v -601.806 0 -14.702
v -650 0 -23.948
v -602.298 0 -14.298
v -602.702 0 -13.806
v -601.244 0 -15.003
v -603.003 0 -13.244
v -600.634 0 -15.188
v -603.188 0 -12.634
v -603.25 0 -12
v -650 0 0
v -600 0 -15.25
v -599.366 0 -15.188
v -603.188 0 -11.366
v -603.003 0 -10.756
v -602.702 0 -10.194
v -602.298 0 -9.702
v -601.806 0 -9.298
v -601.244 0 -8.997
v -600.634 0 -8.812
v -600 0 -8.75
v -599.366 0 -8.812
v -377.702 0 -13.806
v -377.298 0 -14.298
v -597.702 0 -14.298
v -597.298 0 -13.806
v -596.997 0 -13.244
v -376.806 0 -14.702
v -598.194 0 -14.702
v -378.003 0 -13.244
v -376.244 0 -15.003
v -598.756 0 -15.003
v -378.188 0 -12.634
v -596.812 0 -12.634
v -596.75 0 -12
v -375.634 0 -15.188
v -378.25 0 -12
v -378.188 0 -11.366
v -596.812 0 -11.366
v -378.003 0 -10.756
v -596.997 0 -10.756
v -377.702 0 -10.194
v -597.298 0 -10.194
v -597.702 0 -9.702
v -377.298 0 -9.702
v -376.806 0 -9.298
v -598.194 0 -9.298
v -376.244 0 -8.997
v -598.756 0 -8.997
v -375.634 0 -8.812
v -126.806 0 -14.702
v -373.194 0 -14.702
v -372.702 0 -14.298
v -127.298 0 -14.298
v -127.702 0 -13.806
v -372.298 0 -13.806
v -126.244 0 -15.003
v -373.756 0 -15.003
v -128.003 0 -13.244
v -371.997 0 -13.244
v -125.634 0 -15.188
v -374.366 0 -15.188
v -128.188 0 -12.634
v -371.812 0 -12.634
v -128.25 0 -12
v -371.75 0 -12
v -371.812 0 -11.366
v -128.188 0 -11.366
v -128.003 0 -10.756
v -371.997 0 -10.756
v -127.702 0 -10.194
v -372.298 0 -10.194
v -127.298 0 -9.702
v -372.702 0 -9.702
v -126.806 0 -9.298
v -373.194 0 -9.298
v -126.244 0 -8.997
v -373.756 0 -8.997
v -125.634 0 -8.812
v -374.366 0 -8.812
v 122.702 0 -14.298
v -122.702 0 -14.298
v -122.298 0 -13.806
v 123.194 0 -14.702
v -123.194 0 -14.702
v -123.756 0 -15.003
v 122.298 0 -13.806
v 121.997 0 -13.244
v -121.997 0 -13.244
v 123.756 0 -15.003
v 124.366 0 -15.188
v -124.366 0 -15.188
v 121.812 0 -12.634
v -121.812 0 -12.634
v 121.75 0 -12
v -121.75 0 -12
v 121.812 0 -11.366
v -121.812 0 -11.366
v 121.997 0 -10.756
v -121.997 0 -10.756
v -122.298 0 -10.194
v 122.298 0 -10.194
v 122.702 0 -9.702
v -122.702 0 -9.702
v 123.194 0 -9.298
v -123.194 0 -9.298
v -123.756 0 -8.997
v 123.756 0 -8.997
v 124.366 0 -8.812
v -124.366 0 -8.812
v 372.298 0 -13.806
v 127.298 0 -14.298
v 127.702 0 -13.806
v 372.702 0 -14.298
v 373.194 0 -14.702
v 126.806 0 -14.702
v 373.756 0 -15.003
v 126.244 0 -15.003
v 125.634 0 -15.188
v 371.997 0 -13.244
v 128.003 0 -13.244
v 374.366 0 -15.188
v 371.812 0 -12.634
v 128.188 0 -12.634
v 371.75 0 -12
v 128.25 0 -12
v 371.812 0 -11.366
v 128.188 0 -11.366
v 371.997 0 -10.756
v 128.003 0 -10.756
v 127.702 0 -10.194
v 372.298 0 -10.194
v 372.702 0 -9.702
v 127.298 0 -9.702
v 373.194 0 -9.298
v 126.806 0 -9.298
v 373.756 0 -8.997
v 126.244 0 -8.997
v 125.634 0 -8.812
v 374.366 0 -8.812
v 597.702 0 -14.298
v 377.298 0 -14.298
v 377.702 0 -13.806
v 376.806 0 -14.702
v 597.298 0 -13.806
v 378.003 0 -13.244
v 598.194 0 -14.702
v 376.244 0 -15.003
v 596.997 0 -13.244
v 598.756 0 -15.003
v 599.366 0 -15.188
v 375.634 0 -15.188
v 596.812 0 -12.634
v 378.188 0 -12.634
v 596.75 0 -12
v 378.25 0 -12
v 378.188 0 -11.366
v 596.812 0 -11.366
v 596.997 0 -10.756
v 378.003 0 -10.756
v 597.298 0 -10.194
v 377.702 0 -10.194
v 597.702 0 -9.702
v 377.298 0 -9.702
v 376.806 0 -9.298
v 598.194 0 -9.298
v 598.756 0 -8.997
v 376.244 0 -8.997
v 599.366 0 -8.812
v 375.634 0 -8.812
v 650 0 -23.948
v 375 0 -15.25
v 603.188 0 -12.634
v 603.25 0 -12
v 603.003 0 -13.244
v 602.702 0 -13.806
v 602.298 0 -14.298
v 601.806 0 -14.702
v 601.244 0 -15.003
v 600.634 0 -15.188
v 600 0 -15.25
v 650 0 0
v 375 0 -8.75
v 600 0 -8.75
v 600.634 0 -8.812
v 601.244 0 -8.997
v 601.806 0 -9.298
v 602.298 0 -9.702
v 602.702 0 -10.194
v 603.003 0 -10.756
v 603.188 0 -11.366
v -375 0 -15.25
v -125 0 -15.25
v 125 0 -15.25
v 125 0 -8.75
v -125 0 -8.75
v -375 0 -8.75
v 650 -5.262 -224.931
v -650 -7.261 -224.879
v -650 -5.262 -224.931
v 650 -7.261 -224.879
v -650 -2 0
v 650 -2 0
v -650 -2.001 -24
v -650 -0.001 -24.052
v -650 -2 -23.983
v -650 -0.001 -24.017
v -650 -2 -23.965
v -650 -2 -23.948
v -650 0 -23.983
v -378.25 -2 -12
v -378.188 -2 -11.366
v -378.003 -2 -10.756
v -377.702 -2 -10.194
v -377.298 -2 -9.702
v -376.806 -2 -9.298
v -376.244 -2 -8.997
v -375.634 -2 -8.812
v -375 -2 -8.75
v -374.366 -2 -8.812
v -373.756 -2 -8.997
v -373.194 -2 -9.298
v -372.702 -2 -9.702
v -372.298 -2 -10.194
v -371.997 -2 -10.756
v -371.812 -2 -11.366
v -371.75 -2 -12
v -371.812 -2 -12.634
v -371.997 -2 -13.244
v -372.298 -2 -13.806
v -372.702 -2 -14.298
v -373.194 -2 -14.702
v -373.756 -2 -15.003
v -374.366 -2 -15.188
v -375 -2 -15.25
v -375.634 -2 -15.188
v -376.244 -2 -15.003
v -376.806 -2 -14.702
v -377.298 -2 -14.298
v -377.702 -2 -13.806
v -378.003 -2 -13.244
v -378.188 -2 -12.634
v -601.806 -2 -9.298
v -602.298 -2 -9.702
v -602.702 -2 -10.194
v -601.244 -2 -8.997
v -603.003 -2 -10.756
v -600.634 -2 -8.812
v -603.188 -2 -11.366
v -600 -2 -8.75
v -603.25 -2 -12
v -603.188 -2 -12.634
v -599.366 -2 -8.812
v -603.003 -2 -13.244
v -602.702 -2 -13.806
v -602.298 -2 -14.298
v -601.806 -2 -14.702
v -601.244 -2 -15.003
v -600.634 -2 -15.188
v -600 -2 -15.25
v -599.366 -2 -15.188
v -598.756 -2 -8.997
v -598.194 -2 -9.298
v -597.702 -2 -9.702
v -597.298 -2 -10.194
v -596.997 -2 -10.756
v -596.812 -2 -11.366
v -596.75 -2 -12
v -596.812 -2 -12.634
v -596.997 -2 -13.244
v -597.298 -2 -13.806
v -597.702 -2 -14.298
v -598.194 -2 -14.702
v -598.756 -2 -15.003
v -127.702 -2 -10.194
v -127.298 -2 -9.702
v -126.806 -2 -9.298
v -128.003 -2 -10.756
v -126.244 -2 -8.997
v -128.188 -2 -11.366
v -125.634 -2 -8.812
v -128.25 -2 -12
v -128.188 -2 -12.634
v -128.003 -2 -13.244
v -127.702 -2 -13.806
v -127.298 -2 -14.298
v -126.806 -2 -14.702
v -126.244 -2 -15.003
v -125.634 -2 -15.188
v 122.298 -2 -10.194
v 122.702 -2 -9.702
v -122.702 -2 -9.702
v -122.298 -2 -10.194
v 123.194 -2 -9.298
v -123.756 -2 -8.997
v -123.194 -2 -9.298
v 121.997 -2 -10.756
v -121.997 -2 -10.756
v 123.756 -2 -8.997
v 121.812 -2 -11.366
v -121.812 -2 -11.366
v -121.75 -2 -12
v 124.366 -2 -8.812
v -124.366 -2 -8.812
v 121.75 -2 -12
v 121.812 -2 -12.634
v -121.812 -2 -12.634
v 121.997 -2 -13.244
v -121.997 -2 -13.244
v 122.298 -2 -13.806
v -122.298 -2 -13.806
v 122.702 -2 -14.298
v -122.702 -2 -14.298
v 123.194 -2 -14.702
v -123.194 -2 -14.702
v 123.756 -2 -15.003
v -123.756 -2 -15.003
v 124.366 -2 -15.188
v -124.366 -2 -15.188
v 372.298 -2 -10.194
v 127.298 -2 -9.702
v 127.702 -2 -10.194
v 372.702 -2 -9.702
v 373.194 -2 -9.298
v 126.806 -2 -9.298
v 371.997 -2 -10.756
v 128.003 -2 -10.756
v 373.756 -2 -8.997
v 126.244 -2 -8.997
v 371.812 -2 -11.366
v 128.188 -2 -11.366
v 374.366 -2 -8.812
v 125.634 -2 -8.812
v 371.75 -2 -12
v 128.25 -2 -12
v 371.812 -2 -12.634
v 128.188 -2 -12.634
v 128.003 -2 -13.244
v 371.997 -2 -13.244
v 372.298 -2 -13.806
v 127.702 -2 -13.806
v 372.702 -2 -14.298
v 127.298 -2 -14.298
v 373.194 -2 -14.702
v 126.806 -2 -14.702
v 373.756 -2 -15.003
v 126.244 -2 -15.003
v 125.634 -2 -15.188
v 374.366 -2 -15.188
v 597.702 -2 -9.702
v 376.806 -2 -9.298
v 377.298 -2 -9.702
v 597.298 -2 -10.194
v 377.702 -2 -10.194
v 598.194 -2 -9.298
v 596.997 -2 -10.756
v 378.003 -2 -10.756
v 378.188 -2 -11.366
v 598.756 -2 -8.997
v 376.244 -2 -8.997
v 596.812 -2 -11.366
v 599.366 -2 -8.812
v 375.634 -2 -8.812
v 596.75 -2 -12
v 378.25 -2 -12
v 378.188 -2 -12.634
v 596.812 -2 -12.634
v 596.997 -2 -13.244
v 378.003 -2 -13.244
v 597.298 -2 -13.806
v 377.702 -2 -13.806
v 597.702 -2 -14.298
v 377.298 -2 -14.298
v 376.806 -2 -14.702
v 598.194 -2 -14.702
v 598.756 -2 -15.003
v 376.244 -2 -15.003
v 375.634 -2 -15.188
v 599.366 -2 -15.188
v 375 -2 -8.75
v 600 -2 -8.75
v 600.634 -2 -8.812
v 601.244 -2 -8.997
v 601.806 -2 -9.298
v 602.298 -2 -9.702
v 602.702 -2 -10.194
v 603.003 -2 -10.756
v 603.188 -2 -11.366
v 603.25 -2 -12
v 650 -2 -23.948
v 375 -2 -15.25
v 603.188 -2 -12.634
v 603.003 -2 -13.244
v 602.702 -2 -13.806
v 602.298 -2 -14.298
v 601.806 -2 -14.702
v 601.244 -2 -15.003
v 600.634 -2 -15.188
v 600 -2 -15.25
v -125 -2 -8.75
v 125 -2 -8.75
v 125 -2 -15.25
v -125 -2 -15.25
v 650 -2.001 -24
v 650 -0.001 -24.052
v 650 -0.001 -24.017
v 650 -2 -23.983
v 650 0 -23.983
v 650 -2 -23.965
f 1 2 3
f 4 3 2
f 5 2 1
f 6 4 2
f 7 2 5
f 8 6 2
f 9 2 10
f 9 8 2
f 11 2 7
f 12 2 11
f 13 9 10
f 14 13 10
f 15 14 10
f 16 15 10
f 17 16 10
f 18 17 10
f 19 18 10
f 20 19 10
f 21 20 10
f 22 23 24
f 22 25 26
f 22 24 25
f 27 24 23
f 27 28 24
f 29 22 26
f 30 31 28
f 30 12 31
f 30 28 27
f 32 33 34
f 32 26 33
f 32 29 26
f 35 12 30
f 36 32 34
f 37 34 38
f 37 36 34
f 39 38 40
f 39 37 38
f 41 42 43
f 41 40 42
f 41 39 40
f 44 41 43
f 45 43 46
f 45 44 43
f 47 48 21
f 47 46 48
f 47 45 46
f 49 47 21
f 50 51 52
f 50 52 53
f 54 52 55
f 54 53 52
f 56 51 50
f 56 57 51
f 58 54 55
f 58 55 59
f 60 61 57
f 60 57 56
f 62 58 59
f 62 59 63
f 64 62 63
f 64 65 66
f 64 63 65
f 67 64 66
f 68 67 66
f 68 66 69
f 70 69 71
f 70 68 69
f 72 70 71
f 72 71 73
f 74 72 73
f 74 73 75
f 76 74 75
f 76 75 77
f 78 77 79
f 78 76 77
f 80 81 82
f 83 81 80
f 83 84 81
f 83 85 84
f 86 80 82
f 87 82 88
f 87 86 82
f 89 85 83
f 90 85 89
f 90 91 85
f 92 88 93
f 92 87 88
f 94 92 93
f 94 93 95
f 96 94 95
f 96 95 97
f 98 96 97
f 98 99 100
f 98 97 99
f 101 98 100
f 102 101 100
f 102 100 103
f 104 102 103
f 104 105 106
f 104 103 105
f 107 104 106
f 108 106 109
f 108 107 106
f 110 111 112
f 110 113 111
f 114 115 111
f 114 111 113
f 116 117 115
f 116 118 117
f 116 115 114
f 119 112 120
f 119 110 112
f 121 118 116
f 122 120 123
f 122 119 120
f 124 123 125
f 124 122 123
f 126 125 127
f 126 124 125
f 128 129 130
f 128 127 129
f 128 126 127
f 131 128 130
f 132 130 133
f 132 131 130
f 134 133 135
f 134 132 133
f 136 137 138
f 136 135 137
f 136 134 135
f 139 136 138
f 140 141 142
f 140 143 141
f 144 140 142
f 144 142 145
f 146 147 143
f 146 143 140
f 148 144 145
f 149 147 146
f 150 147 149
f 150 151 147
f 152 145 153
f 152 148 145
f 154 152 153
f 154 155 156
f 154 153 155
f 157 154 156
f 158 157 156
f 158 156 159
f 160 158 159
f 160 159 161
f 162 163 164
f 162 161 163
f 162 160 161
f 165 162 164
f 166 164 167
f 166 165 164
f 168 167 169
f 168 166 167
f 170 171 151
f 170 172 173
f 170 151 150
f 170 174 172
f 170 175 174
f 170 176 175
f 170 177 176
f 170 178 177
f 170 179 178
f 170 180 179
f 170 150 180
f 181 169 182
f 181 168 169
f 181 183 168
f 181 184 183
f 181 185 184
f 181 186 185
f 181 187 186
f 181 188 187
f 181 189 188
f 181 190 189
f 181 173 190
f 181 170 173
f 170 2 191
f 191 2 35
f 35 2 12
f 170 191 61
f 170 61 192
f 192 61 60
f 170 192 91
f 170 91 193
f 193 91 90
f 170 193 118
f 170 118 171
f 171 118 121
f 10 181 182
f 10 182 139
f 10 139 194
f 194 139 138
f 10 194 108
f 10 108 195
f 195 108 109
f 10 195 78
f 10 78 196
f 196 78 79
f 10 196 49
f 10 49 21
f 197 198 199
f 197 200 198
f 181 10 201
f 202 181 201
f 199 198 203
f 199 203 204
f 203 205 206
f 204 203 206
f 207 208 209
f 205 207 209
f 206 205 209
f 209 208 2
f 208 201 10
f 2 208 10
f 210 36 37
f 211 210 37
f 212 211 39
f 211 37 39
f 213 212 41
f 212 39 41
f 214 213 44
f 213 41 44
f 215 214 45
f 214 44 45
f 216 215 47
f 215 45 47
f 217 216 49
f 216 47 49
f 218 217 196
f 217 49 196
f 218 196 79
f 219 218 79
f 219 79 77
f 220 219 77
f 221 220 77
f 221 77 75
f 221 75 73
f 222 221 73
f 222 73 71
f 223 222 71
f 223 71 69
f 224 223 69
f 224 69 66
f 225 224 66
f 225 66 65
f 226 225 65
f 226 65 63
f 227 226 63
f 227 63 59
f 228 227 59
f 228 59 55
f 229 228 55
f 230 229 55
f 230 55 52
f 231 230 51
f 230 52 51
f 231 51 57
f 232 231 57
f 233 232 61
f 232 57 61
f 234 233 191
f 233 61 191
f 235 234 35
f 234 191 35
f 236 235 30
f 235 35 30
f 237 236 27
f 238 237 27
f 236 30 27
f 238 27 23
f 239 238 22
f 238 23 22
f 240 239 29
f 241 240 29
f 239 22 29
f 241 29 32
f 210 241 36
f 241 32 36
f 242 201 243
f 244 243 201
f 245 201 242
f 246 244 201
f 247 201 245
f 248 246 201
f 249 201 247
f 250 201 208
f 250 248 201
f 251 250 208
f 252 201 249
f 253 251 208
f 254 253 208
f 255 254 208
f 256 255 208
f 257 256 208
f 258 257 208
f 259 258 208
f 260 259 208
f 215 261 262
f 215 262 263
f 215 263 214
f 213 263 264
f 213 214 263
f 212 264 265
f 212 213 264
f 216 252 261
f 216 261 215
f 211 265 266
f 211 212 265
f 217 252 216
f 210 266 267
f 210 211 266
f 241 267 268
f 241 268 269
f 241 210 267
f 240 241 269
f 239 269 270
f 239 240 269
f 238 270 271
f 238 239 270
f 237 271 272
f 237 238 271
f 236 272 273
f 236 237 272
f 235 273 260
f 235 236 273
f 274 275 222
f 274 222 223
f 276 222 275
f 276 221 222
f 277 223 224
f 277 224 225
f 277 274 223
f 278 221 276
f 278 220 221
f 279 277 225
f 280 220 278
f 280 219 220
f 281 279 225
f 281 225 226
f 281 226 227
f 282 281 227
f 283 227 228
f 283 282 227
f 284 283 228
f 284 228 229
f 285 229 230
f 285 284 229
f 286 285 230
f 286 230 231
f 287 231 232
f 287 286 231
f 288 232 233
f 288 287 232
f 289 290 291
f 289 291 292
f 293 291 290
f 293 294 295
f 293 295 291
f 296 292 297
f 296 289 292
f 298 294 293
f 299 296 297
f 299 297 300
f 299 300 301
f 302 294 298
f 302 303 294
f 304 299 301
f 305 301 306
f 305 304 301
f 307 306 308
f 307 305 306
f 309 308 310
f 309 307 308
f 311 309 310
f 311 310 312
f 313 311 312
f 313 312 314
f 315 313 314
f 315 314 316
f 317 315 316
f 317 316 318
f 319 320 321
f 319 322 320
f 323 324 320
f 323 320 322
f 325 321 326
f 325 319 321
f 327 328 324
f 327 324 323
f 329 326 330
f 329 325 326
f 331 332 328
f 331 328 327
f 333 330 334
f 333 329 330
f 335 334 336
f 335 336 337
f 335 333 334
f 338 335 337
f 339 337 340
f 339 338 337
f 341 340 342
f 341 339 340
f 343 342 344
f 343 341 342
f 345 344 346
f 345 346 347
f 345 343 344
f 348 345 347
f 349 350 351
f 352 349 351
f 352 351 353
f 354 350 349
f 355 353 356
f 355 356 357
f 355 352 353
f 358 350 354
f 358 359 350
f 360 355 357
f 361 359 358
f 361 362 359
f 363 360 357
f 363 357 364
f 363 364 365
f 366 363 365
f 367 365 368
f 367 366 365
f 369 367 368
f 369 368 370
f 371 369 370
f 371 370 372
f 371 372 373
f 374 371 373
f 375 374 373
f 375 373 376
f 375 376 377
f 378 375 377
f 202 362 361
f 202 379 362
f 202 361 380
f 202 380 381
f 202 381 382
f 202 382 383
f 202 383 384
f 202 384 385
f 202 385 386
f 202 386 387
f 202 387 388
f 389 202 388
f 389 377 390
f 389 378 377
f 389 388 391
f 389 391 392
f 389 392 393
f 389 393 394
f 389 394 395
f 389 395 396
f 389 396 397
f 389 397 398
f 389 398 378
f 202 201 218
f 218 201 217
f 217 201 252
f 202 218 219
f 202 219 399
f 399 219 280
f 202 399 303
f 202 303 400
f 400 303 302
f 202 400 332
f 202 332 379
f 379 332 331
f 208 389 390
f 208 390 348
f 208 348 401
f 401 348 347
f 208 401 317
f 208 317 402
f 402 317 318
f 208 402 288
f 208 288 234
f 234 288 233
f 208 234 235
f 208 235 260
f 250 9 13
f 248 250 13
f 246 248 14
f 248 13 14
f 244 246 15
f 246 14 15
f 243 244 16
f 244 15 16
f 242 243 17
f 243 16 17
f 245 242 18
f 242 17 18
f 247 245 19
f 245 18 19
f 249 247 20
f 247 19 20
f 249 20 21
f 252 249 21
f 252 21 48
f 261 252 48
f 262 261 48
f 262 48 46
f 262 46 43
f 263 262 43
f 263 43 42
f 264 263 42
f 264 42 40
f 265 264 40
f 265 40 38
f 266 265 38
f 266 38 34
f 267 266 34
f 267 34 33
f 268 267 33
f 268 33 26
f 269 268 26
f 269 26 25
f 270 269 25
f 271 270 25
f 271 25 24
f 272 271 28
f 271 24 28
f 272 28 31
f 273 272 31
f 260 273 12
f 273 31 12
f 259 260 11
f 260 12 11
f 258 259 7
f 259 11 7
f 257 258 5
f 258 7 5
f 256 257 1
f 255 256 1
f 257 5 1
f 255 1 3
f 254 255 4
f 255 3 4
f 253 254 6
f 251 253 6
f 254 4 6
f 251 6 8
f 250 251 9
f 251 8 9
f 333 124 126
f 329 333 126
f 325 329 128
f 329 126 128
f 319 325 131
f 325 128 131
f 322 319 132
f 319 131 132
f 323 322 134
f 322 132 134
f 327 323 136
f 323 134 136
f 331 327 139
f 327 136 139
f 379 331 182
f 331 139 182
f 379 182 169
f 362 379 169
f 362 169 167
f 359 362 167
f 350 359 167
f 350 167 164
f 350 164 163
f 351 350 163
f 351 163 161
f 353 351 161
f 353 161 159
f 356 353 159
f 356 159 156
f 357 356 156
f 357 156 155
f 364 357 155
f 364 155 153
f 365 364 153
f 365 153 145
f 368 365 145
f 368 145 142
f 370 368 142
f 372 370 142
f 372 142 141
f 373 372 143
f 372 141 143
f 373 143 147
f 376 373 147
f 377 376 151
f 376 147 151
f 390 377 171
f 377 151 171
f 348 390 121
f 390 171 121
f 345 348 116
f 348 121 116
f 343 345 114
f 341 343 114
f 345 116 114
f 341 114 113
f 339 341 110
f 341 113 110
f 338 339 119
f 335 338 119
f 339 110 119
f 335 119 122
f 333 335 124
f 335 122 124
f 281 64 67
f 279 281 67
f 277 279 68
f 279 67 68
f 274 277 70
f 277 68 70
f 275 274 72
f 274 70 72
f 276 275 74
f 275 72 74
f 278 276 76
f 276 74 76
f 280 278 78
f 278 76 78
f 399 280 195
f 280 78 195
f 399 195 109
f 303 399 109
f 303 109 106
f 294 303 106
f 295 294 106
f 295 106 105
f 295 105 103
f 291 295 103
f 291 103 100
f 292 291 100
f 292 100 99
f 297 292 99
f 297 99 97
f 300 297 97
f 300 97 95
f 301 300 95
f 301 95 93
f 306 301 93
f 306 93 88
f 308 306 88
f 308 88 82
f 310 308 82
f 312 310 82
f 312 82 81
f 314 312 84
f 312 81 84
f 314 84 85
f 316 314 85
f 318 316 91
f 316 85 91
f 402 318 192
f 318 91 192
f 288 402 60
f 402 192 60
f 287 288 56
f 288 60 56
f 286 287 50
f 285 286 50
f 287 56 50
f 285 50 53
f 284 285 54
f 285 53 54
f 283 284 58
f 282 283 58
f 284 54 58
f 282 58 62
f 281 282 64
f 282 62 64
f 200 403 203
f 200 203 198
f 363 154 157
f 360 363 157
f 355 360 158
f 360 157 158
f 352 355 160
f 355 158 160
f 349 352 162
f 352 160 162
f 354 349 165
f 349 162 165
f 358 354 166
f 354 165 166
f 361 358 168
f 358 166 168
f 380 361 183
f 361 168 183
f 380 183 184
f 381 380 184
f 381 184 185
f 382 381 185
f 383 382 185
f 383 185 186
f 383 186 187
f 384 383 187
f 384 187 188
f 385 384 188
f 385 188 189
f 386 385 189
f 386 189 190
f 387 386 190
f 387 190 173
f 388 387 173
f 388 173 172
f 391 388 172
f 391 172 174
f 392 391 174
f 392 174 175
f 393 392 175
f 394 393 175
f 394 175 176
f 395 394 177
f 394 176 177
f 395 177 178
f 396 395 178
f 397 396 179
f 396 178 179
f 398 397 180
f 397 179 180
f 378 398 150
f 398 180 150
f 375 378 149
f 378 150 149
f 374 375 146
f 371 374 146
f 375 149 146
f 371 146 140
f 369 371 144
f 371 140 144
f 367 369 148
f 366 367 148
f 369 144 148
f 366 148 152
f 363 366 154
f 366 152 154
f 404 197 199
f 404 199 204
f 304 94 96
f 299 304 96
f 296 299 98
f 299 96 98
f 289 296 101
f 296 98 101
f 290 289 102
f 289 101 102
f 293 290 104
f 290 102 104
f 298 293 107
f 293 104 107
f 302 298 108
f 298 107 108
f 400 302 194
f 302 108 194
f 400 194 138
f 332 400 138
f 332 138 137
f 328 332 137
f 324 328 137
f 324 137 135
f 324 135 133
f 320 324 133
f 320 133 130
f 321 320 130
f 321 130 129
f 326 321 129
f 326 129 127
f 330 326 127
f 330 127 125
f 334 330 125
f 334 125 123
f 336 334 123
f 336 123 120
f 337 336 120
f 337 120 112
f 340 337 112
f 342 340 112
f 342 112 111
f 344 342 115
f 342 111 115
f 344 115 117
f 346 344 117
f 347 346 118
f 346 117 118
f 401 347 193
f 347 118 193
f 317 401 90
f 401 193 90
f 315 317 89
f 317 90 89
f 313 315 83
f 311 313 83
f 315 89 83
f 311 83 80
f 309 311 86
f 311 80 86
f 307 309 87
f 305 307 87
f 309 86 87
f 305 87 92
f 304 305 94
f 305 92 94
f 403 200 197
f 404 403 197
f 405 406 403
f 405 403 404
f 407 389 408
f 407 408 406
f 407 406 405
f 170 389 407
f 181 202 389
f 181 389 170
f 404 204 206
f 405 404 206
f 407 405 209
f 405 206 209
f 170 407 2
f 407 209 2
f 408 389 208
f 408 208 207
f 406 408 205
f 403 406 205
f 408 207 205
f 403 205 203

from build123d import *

# Parameters (mm, degrees)
F1_DEPTH    = 650
F2_R        = 3.25
F3_DEPTH    = 25
F4_T1_DEPTH = 1300
F5_T1_DEPTH = 1300.2618143417


# Not quite as in the source:
# - a fillet or chamfer that OpenCascade refuses, or shapes differently, is made with other operations: its cross-section is extruded or revolved along the edge and cut away or added


with BuildPart() as f1:
    # F0 (on Right) → F1 (new body, symmetric)
    with BuildSketch(Plane.YZ):
        Polygon((0, -24), (0, 0), (-2, 0), (-2, -23.9738185658), (-7.2608812598, -224.8787684235), (-5.2615666099, -224.9311223201), align=None)
    extrude(amount=F1_DEPTH, both=True)

    # F2 (on face) → F3 (cut)
    with BuildSketch(Plane(origin=(0, 0, 0), x_dir=(-1, 0, 0), z_dir=(0, 1, 0))):
        with Locations((-600, -12)):
            Circle(F2_R)
        with Locations((-375, -12)):
            Circle(F2_R)
        with Locations((-125, -12)):
            Circle(F2_R)
        with Locations((600, -12)):
            Circle(F2_R)
        with Locations((375, -12)):
            Circle(F2_R)
        with Locations((125, -12)):
            Circle(F2_R)
    extrude(amount=-F3_DEPTH, mode=Mode.SUBTRACT)

    # F4: fillet of radius 2 on 1 edges, made by hand

    # F4_s2 → F4_t1 (join)
    with BuildSketch(Plane.YZ.offset(-650)):
        with BuildLine():
            ThreePointArc((-2, -23.9476371317), (-2.0001713449, -23.9738163228), (-2.00068535, -23.9999910283))
            Line((-2.00068535, -23.9999910283), (-2, -23.9738185658))
            Line((-2, -23.9738185658), (-2, -23.9476371317))
        make_face()
    extrude(amount=F4_T1_DEPTH)

    # F5: fillet of radius 4 on 1 edges, made by hand

    # F5_s2 → F5_t1 (cut)
    with BuildSketch(Plane.YZ.offset(-650.1309071708)):
        with BuildLine():
            ThreePointArc((-0.0013707001, -24.0523449249), (-0.0003426897, -23.9999955139), (0, -23.9476371317))
            Line((0, -23.9476371317), (0, -24))
            Line((0, -24), (-0.0013707001, -24.0523449249))
        make_face()
    extrude(amount=F5_T1_DEPTH, mode=Mode.SUBTRACT)


solid = f1.part
